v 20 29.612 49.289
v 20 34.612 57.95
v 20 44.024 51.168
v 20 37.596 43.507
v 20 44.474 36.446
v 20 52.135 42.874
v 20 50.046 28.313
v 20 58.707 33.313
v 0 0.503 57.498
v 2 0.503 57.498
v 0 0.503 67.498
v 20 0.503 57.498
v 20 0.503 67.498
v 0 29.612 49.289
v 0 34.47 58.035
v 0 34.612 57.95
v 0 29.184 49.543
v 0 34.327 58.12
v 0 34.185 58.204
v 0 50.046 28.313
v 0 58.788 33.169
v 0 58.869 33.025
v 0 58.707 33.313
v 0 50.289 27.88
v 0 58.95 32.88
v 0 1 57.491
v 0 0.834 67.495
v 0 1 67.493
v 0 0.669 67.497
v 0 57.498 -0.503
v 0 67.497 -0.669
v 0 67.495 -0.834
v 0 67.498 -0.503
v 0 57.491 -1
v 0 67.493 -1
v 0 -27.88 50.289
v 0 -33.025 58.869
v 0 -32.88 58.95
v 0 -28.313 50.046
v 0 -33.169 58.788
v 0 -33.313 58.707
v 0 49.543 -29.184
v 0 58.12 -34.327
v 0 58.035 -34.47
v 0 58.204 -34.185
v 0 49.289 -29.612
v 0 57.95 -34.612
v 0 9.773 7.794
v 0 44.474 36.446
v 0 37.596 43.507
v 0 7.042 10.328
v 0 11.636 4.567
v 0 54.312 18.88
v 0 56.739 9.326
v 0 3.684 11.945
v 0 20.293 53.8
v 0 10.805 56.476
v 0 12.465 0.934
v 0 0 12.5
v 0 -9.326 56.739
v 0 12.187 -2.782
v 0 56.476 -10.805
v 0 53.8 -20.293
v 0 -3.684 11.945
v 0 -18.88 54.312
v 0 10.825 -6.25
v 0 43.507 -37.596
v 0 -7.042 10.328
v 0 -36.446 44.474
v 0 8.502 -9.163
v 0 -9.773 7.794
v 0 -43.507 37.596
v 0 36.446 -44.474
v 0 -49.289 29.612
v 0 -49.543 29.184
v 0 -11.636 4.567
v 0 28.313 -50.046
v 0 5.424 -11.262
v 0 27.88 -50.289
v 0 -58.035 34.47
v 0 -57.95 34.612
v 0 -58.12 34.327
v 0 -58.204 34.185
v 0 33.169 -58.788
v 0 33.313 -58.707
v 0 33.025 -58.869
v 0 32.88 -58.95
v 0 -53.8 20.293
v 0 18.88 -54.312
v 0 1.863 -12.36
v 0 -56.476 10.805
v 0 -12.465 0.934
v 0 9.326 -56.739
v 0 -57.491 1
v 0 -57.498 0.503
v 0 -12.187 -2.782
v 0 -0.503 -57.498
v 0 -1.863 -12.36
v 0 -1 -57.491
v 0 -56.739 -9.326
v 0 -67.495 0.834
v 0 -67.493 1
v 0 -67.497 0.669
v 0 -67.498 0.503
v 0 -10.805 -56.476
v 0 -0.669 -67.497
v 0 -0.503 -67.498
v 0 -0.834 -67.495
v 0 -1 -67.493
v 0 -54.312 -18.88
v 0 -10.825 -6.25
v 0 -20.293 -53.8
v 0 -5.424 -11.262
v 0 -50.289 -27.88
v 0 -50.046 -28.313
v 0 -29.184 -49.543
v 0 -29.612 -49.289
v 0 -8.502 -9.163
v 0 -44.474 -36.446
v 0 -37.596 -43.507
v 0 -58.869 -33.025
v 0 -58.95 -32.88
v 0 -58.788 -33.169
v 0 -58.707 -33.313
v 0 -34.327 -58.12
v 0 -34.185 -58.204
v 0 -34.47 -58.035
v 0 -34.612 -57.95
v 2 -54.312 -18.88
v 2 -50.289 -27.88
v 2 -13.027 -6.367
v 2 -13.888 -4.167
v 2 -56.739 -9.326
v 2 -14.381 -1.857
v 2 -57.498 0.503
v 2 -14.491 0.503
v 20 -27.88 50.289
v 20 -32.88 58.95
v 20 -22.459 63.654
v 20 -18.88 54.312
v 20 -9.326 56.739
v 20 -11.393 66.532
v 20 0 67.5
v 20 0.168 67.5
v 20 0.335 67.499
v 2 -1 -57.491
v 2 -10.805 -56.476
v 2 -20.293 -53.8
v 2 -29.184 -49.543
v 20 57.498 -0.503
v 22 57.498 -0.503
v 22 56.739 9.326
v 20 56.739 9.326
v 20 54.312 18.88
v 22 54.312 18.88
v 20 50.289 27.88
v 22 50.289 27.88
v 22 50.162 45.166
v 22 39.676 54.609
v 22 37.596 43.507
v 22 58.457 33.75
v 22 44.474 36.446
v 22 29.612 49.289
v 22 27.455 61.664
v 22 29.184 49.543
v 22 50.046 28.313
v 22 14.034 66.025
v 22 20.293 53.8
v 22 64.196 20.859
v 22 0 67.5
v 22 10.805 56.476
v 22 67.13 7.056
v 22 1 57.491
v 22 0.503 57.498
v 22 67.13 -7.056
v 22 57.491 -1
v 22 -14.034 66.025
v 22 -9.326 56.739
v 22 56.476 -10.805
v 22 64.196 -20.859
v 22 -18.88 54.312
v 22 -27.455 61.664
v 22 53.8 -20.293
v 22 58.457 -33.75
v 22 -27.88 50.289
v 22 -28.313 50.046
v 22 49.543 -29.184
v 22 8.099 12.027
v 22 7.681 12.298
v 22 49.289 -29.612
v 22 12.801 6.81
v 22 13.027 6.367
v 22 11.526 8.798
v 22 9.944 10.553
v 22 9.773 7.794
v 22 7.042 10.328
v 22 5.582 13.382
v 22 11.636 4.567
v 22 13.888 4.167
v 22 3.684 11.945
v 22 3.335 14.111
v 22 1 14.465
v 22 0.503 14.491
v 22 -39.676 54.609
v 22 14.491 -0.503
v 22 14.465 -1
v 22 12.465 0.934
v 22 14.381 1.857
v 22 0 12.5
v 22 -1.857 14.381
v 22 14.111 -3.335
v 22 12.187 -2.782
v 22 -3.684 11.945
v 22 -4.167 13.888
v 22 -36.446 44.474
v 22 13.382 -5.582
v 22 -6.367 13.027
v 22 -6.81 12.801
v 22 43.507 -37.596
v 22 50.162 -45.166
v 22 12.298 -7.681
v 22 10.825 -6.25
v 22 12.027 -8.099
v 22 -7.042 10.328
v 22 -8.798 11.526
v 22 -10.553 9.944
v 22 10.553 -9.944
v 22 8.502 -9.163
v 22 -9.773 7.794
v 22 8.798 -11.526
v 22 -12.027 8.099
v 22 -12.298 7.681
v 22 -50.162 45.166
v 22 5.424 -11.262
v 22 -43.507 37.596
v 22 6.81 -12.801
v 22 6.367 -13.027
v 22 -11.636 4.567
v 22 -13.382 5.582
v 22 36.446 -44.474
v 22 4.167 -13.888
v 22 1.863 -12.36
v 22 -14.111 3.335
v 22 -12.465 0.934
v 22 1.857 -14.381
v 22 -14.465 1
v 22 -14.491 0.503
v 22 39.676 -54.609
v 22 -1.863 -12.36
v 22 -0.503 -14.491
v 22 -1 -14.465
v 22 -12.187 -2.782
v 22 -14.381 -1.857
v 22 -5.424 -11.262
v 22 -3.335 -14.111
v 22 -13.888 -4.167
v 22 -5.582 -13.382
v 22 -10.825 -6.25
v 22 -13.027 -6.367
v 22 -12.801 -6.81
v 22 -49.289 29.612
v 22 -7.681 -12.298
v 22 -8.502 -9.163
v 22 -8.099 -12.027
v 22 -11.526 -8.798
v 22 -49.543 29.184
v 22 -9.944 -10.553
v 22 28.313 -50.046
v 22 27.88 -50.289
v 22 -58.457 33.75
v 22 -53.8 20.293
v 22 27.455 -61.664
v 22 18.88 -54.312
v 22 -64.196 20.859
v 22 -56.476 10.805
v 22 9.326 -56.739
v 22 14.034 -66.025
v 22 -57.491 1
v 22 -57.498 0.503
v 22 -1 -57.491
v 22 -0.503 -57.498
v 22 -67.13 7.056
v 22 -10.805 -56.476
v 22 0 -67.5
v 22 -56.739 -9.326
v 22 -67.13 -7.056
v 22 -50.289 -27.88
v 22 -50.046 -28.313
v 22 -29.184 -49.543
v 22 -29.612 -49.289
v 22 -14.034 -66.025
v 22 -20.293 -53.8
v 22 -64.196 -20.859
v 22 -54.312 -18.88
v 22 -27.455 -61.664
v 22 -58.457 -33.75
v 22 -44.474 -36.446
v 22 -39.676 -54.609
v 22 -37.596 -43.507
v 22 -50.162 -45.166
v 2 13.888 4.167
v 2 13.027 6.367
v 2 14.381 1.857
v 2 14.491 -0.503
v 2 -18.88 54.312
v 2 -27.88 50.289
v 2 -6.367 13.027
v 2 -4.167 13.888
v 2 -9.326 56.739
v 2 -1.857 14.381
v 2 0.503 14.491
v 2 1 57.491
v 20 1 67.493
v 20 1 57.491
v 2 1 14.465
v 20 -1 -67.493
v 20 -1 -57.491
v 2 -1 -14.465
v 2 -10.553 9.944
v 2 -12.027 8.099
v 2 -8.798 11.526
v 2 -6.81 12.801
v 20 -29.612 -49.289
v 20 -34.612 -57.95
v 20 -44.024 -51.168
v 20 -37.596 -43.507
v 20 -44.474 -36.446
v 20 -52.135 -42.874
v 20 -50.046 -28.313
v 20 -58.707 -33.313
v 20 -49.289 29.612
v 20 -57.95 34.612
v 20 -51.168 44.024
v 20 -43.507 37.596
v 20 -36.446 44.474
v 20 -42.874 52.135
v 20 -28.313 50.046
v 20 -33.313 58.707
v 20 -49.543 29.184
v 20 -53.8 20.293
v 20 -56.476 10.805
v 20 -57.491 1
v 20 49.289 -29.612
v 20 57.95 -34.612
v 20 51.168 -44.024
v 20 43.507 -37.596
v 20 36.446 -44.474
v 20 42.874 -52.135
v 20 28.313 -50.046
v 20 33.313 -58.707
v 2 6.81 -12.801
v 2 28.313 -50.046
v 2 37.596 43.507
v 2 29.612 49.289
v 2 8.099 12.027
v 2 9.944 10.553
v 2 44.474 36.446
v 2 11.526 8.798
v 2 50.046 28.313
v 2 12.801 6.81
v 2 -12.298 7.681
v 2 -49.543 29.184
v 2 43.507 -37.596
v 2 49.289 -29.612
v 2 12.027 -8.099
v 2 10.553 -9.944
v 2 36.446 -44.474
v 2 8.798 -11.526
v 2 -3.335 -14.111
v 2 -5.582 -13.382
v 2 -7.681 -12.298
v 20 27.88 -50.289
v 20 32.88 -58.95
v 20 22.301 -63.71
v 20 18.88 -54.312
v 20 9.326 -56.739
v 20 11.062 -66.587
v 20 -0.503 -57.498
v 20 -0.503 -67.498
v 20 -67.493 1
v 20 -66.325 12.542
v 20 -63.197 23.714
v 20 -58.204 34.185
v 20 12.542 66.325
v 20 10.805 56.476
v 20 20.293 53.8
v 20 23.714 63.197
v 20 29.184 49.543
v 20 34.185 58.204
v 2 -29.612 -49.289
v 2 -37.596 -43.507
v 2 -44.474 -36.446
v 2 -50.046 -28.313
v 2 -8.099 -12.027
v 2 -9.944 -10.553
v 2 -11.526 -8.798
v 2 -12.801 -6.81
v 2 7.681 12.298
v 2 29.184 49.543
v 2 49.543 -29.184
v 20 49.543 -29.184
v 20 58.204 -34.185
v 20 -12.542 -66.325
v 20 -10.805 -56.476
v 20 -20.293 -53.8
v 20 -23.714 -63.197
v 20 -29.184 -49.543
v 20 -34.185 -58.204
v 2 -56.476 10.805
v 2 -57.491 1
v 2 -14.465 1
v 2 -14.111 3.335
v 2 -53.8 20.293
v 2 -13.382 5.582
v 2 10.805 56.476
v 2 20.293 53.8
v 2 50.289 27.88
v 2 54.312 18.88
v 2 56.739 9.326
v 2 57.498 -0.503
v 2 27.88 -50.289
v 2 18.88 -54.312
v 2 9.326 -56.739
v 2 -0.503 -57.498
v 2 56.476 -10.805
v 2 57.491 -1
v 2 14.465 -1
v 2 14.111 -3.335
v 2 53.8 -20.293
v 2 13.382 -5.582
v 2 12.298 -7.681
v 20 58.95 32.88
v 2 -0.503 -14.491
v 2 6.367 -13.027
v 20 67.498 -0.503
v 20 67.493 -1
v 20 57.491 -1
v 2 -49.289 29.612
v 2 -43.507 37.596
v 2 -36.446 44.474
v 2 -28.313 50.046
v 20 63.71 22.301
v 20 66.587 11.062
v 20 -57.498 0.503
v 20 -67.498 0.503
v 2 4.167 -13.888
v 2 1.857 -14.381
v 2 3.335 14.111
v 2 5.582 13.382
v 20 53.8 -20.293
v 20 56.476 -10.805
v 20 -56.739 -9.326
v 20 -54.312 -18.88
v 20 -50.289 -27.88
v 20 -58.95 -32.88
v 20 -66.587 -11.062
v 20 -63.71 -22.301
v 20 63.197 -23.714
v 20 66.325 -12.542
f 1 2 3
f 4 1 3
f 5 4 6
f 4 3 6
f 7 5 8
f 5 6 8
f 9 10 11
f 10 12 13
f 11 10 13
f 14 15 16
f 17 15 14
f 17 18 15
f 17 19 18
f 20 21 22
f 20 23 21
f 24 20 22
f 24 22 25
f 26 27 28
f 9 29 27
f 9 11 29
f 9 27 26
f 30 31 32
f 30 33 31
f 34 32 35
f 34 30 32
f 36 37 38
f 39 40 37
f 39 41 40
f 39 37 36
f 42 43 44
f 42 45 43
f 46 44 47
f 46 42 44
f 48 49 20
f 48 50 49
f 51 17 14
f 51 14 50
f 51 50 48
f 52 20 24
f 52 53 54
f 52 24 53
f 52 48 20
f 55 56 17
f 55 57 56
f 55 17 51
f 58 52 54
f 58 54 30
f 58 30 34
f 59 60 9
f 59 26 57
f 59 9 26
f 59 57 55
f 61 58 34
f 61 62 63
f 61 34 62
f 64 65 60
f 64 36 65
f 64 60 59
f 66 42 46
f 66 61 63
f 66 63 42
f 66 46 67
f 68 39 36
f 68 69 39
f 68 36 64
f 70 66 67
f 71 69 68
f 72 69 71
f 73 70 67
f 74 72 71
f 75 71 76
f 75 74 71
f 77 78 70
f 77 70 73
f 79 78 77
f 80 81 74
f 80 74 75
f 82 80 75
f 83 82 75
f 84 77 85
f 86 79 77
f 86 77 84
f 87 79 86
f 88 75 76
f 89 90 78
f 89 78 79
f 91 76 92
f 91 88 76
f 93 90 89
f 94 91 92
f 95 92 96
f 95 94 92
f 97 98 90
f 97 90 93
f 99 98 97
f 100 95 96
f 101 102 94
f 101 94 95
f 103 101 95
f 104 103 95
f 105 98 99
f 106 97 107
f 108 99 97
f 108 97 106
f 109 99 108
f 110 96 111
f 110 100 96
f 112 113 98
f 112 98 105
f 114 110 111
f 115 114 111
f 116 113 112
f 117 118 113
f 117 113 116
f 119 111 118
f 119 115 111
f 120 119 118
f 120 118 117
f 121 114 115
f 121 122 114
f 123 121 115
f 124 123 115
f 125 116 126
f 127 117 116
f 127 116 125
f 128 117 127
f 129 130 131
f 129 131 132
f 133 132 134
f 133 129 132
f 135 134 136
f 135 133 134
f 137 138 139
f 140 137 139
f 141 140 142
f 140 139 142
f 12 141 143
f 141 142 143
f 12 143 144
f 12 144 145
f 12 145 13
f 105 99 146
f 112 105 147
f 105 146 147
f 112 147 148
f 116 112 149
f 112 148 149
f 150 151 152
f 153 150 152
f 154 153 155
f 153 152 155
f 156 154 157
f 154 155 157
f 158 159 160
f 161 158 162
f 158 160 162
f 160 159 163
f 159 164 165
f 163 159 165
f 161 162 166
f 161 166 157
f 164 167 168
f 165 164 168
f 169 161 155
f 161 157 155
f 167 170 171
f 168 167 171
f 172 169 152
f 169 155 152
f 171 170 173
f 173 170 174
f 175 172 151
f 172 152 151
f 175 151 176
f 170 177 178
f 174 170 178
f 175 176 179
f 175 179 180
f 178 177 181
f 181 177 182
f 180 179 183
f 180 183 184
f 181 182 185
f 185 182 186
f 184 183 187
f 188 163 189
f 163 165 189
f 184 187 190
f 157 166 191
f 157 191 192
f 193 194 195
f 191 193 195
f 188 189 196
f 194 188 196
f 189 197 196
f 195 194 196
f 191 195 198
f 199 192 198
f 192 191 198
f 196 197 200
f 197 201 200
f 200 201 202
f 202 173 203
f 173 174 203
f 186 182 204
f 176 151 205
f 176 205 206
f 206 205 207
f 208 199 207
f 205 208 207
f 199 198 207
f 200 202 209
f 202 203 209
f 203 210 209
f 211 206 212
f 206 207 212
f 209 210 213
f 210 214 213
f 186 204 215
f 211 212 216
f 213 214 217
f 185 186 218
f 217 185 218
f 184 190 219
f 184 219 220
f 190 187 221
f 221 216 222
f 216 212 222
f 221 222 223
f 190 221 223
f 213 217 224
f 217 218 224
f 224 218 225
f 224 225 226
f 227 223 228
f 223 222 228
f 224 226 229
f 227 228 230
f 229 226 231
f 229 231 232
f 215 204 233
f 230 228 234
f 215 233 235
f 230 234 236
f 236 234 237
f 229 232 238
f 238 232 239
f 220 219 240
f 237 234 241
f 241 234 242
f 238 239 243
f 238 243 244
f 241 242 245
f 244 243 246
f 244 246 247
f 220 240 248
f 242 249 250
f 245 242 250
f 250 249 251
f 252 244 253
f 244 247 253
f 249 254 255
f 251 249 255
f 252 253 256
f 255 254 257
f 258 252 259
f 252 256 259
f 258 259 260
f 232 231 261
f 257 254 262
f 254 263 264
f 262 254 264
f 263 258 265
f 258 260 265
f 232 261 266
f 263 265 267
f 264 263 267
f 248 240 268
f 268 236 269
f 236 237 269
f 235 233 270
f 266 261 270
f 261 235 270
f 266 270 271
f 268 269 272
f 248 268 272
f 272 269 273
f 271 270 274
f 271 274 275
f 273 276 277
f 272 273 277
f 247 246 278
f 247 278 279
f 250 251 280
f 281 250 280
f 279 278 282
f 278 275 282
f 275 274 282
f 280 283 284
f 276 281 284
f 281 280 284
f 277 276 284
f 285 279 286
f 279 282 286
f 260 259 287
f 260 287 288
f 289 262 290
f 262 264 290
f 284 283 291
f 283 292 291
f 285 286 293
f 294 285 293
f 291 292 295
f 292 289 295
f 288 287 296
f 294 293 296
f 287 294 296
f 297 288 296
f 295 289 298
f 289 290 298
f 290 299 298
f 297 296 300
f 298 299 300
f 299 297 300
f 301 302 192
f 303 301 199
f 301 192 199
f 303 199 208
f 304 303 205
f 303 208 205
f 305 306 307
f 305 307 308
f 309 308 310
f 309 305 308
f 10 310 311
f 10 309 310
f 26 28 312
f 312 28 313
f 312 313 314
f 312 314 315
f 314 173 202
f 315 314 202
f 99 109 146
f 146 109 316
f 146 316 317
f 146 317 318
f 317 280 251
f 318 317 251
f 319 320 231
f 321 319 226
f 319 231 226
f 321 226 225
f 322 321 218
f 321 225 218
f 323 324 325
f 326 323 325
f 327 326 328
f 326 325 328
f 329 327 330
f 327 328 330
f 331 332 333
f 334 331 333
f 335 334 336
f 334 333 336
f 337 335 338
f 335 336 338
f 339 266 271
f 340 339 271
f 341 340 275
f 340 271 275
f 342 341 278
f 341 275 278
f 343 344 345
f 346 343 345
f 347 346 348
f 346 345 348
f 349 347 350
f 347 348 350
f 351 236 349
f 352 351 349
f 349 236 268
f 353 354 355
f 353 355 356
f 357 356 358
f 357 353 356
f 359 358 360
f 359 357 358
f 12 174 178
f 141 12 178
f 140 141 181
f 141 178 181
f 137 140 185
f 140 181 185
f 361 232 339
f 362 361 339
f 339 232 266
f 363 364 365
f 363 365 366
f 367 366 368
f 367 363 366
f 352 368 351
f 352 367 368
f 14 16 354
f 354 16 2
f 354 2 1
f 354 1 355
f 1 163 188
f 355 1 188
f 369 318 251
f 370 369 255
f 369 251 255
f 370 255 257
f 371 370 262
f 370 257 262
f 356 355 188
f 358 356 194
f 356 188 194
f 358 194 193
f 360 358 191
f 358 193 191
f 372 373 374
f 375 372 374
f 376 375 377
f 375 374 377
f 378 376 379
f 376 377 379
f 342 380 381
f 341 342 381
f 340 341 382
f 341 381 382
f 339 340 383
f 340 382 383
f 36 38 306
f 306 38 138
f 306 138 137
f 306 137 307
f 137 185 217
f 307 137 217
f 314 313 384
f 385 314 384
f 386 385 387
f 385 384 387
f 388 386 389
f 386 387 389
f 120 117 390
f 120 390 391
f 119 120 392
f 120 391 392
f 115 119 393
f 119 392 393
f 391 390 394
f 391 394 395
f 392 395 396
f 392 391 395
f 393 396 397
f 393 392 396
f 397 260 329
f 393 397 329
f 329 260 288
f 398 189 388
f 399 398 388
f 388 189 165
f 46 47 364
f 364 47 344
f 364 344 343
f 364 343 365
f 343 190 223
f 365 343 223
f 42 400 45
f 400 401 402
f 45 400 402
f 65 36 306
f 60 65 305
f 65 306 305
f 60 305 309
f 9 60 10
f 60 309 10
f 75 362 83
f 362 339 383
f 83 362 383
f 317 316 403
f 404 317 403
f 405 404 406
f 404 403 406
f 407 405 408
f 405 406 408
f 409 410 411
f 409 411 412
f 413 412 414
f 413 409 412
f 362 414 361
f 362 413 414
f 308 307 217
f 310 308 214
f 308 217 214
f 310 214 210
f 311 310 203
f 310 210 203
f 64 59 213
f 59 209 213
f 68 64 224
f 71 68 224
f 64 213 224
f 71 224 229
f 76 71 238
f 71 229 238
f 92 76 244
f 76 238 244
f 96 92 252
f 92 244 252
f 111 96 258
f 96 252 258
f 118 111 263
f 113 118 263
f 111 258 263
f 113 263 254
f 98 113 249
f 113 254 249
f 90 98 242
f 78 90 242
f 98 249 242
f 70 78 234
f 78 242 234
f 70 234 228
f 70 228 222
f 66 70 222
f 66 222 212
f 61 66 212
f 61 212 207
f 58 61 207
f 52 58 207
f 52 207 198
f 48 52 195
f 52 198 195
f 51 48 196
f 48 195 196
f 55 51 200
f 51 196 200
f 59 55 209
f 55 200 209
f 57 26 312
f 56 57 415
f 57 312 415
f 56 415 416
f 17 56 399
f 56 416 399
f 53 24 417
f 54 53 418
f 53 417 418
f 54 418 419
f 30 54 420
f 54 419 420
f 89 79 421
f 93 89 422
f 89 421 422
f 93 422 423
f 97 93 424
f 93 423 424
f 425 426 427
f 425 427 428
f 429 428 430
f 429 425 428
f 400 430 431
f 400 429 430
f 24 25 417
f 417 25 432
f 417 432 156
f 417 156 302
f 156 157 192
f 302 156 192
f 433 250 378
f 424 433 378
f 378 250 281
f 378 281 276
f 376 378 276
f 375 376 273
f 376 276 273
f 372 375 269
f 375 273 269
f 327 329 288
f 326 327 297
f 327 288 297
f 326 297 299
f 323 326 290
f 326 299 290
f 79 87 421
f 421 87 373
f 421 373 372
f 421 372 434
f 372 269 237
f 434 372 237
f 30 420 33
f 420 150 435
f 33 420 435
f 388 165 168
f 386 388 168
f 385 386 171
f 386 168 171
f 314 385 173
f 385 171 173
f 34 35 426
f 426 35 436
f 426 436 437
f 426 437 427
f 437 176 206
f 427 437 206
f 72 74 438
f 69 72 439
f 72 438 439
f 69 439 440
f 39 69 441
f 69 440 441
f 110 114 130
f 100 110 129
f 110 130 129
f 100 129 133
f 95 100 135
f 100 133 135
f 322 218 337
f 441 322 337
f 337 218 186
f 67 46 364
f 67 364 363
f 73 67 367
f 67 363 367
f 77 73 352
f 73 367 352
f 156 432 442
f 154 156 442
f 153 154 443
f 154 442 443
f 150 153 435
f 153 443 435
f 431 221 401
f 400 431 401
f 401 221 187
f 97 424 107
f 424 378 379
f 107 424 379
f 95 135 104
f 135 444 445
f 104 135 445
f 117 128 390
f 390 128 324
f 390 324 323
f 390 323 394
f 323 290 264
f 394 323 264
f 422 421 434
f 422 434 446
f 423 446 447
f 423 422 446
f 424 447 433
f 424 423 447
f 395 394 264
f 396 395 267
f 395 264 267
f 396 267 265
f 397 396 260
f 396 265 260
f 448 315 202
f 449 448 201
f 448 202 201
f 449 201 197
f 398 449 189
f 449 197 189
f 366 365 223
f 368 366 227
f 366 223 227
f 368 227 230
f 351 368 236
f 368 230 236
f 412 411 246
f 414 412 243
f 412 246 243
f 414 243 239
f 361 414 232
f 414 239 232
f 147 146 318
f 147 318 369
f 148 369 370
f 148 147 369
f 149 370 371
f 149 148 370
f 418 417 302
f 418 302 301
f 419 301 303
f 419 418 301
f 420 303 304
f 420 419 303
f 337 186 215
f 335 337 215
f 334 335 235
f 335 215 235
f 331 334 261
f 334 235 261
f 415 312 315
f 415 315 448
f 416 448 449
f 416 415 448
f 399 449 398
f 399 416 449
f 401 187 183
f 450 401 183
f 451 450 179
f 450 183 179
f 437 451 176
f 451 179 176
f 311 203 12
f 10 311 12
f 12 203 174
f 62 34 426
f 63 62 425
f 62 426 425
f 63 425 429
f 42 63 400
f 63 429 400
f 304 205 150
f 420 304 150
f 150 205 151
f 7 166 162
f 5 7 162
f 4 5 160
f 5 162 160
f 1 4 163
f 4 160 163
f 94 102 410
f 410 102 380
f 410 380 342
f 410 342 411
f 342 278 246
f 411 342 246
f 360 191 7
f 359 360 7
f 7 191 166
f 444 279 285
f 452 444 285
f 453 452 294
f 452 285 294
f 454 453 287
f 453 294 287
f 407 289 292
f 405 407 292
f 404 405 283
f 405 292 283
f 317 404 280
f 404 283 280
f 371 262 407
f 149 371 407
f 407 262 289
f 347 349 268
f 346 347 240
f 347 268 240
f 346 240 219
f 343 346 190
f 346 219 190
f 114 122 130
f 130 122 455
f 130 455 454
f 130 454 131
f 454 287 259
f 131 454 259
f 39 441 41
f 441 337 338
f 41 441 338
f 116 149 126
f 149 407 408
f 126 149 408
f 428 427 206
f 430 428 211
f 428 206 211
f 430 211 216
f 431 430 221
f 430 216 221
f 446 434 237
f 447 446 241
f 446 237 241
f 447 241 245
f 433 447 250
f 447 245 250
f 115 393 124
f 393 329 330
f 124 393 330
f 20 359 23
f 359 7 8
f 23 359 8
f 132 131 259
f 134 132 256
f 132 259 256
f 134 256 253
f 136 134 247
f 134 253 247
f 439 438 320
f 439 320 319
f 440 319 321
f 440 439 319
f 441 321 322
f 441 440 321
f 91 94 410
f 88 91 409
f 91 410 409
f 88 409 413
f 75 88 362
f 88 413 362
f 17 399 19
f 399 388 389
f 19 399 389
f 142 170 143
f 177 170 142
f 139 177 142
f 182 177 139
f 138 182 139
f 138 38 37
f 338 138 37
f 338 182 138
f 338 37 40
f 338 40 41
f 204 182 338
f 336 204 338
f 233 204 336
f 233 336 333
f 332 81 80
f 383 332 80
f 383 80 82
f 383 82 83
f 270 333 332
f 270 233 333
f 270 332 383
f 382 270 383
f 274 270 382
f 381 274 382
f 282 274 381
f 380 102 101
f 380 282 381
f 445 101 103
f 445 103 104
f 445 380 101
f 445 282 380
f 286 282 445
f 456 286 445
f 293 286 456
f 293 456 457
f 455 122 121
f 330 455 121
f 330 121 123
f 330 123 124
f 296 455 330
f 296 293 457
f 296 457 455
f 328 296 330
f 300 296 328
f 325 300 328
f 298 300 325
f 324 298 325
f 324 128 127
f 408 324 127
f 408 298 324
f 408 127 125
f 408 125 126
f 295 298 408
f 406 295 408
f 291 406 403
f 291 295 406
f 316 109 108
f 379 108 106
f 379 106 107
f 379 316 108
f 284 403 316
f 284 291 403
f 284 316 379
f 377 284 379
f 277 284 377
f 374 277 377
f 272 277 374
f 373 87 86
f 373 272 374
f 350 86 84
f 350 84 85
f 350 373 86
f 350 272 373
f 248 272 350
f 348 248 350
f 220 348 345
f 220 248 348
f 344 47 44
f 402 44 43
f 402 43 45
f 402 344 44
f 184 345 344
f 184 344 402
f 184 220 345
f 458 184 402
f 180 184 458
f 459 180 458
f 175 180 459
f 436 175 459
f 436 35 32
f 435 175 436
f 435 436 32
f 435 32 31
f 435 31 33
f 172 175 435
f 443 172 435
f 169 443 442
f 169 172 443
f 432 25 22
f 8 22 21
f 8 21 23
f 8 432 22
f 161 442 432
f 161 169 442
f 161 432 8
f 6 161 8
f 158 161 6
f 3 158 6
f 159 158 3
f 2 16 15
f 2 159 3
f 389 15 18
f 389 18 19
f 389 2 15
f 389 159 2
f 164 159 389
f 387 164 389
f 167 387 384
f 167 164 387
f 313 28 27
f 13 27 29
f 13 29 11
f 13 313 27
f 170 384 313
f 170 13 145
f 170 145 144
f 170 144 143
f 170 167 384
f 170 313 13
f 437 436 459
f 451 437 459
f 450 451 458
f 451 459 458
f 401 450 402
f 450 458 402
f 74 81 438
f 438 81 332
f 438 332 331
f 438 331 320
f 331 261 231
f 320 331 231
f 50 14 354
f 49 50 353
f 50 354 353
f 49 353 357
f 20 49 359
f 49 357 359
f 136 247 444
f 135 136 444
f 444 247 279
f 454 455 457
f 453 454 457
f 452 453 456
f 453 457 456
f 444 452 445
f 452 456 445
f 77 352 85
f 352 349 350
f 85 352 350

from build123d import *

# Parameters (mm, degrees)
ESBO_O1_W             = 22
ESBO_O1_H             = 55
CORTE_EXTRUS_O1_DEPTH = 20
CIRPATTERN1_COUNT     = 12
CORTE_EXTRUS_O2_DEPTH = 98.532046016
CIRPATTERN2_COUNT     = 12


with BuildPart() as part:
    # Esboço1 → Revolução1 (revolve)
    with BuildSketch(Plane.XY, mode=Mode.PRIVATE) as revolu_o1_sk:
        with Locations((11, 40)):
            Rectangle(ESBO_O1_W, ESBO_O1_H)
    revolve(revolu_o1_sk.sketch.rotate(Axis((0, 0, 0), (1, 0, 0)), 90), axis=Axis((0, 0, 0), (1, 0, 0)))

    # Esboço2 → Corte-extrusão1 (cut)
    with BuildSketch(Plane(origin=(22, 0, 0), x_dir=(0, 0, -1), z_dir=(1, 0, 0))):
        with BuildLine():
            Line((1, 57.49130369), (1, 14.465476141))
            ThreePointArc((1, 14.465476141), (4.473814272, 13.792569951), (7.681217142, 12.298329286))
            Line((7.681217142, 12.298329286), (29.184480159, 49.543073359))
            ThreePointArc((29.184480159, 49.543073359), (15.606706954, 55.34149165), (1, 57.49130369))
        make_face()
    corte_extrus_o1 = extrude(amount=-CORTE_EXTRUS_O1_DEPTH, mode=Mode.SUBTRACT)

    # CirPattern1: Corte-extrusão1 ×12 about axis
    cirpattern1_axis = Axis((0, 0, 0), (1, 0, 0))
    for i in range(1, CIRPATTERN1_COUNT):
        add(corte_extrus_o1.rotate(cirpattern1_axis, i * 360 / CIRPATTERN1_COUNT), mode=Mode.SUBTRACT)

    # Esboço3 → Corte-extrusão2 (cut, through all)
    with BuildSketch(Plane(origin=(20, 0, 0), x_dir=(0, 0, -1), z_dir=(1, 0, 0))):
        with BuildLine():
            Line((29.184480159, 49.543073359), (34.184643112, 58.203609641))
            ThreePointArc((34.184643112, 58.203609641), (18.195083867, 65.001453238), (1, 67.492592186))
            Line((1, 67.492592186), (1, 57.49130369))
            ThreePointArc((1, 57.49130369), (15.606706954, 55.34149165), (29.184480159, 49.543073359))
        make_face()
    corte_extrus_o2 = extrude(amount=-CORTE_EXTRUS_O2_DEPTH, mode=Mode.SUBTRACT)

    # CirPattern2: Corte-extrusão2 ×12 about axis
    cirpattern2_axis = Axis((0, 0, 0), (1, 0, 0))
    for i in range(1, CIRPATTERN2_COUNT):
        add(corte_extrus_o2.rotate(cirpattern2_axis, i * 360 / CIRPATTERN2_COUNT), mode=Mode.SUBTRACT)


solid = part.part
